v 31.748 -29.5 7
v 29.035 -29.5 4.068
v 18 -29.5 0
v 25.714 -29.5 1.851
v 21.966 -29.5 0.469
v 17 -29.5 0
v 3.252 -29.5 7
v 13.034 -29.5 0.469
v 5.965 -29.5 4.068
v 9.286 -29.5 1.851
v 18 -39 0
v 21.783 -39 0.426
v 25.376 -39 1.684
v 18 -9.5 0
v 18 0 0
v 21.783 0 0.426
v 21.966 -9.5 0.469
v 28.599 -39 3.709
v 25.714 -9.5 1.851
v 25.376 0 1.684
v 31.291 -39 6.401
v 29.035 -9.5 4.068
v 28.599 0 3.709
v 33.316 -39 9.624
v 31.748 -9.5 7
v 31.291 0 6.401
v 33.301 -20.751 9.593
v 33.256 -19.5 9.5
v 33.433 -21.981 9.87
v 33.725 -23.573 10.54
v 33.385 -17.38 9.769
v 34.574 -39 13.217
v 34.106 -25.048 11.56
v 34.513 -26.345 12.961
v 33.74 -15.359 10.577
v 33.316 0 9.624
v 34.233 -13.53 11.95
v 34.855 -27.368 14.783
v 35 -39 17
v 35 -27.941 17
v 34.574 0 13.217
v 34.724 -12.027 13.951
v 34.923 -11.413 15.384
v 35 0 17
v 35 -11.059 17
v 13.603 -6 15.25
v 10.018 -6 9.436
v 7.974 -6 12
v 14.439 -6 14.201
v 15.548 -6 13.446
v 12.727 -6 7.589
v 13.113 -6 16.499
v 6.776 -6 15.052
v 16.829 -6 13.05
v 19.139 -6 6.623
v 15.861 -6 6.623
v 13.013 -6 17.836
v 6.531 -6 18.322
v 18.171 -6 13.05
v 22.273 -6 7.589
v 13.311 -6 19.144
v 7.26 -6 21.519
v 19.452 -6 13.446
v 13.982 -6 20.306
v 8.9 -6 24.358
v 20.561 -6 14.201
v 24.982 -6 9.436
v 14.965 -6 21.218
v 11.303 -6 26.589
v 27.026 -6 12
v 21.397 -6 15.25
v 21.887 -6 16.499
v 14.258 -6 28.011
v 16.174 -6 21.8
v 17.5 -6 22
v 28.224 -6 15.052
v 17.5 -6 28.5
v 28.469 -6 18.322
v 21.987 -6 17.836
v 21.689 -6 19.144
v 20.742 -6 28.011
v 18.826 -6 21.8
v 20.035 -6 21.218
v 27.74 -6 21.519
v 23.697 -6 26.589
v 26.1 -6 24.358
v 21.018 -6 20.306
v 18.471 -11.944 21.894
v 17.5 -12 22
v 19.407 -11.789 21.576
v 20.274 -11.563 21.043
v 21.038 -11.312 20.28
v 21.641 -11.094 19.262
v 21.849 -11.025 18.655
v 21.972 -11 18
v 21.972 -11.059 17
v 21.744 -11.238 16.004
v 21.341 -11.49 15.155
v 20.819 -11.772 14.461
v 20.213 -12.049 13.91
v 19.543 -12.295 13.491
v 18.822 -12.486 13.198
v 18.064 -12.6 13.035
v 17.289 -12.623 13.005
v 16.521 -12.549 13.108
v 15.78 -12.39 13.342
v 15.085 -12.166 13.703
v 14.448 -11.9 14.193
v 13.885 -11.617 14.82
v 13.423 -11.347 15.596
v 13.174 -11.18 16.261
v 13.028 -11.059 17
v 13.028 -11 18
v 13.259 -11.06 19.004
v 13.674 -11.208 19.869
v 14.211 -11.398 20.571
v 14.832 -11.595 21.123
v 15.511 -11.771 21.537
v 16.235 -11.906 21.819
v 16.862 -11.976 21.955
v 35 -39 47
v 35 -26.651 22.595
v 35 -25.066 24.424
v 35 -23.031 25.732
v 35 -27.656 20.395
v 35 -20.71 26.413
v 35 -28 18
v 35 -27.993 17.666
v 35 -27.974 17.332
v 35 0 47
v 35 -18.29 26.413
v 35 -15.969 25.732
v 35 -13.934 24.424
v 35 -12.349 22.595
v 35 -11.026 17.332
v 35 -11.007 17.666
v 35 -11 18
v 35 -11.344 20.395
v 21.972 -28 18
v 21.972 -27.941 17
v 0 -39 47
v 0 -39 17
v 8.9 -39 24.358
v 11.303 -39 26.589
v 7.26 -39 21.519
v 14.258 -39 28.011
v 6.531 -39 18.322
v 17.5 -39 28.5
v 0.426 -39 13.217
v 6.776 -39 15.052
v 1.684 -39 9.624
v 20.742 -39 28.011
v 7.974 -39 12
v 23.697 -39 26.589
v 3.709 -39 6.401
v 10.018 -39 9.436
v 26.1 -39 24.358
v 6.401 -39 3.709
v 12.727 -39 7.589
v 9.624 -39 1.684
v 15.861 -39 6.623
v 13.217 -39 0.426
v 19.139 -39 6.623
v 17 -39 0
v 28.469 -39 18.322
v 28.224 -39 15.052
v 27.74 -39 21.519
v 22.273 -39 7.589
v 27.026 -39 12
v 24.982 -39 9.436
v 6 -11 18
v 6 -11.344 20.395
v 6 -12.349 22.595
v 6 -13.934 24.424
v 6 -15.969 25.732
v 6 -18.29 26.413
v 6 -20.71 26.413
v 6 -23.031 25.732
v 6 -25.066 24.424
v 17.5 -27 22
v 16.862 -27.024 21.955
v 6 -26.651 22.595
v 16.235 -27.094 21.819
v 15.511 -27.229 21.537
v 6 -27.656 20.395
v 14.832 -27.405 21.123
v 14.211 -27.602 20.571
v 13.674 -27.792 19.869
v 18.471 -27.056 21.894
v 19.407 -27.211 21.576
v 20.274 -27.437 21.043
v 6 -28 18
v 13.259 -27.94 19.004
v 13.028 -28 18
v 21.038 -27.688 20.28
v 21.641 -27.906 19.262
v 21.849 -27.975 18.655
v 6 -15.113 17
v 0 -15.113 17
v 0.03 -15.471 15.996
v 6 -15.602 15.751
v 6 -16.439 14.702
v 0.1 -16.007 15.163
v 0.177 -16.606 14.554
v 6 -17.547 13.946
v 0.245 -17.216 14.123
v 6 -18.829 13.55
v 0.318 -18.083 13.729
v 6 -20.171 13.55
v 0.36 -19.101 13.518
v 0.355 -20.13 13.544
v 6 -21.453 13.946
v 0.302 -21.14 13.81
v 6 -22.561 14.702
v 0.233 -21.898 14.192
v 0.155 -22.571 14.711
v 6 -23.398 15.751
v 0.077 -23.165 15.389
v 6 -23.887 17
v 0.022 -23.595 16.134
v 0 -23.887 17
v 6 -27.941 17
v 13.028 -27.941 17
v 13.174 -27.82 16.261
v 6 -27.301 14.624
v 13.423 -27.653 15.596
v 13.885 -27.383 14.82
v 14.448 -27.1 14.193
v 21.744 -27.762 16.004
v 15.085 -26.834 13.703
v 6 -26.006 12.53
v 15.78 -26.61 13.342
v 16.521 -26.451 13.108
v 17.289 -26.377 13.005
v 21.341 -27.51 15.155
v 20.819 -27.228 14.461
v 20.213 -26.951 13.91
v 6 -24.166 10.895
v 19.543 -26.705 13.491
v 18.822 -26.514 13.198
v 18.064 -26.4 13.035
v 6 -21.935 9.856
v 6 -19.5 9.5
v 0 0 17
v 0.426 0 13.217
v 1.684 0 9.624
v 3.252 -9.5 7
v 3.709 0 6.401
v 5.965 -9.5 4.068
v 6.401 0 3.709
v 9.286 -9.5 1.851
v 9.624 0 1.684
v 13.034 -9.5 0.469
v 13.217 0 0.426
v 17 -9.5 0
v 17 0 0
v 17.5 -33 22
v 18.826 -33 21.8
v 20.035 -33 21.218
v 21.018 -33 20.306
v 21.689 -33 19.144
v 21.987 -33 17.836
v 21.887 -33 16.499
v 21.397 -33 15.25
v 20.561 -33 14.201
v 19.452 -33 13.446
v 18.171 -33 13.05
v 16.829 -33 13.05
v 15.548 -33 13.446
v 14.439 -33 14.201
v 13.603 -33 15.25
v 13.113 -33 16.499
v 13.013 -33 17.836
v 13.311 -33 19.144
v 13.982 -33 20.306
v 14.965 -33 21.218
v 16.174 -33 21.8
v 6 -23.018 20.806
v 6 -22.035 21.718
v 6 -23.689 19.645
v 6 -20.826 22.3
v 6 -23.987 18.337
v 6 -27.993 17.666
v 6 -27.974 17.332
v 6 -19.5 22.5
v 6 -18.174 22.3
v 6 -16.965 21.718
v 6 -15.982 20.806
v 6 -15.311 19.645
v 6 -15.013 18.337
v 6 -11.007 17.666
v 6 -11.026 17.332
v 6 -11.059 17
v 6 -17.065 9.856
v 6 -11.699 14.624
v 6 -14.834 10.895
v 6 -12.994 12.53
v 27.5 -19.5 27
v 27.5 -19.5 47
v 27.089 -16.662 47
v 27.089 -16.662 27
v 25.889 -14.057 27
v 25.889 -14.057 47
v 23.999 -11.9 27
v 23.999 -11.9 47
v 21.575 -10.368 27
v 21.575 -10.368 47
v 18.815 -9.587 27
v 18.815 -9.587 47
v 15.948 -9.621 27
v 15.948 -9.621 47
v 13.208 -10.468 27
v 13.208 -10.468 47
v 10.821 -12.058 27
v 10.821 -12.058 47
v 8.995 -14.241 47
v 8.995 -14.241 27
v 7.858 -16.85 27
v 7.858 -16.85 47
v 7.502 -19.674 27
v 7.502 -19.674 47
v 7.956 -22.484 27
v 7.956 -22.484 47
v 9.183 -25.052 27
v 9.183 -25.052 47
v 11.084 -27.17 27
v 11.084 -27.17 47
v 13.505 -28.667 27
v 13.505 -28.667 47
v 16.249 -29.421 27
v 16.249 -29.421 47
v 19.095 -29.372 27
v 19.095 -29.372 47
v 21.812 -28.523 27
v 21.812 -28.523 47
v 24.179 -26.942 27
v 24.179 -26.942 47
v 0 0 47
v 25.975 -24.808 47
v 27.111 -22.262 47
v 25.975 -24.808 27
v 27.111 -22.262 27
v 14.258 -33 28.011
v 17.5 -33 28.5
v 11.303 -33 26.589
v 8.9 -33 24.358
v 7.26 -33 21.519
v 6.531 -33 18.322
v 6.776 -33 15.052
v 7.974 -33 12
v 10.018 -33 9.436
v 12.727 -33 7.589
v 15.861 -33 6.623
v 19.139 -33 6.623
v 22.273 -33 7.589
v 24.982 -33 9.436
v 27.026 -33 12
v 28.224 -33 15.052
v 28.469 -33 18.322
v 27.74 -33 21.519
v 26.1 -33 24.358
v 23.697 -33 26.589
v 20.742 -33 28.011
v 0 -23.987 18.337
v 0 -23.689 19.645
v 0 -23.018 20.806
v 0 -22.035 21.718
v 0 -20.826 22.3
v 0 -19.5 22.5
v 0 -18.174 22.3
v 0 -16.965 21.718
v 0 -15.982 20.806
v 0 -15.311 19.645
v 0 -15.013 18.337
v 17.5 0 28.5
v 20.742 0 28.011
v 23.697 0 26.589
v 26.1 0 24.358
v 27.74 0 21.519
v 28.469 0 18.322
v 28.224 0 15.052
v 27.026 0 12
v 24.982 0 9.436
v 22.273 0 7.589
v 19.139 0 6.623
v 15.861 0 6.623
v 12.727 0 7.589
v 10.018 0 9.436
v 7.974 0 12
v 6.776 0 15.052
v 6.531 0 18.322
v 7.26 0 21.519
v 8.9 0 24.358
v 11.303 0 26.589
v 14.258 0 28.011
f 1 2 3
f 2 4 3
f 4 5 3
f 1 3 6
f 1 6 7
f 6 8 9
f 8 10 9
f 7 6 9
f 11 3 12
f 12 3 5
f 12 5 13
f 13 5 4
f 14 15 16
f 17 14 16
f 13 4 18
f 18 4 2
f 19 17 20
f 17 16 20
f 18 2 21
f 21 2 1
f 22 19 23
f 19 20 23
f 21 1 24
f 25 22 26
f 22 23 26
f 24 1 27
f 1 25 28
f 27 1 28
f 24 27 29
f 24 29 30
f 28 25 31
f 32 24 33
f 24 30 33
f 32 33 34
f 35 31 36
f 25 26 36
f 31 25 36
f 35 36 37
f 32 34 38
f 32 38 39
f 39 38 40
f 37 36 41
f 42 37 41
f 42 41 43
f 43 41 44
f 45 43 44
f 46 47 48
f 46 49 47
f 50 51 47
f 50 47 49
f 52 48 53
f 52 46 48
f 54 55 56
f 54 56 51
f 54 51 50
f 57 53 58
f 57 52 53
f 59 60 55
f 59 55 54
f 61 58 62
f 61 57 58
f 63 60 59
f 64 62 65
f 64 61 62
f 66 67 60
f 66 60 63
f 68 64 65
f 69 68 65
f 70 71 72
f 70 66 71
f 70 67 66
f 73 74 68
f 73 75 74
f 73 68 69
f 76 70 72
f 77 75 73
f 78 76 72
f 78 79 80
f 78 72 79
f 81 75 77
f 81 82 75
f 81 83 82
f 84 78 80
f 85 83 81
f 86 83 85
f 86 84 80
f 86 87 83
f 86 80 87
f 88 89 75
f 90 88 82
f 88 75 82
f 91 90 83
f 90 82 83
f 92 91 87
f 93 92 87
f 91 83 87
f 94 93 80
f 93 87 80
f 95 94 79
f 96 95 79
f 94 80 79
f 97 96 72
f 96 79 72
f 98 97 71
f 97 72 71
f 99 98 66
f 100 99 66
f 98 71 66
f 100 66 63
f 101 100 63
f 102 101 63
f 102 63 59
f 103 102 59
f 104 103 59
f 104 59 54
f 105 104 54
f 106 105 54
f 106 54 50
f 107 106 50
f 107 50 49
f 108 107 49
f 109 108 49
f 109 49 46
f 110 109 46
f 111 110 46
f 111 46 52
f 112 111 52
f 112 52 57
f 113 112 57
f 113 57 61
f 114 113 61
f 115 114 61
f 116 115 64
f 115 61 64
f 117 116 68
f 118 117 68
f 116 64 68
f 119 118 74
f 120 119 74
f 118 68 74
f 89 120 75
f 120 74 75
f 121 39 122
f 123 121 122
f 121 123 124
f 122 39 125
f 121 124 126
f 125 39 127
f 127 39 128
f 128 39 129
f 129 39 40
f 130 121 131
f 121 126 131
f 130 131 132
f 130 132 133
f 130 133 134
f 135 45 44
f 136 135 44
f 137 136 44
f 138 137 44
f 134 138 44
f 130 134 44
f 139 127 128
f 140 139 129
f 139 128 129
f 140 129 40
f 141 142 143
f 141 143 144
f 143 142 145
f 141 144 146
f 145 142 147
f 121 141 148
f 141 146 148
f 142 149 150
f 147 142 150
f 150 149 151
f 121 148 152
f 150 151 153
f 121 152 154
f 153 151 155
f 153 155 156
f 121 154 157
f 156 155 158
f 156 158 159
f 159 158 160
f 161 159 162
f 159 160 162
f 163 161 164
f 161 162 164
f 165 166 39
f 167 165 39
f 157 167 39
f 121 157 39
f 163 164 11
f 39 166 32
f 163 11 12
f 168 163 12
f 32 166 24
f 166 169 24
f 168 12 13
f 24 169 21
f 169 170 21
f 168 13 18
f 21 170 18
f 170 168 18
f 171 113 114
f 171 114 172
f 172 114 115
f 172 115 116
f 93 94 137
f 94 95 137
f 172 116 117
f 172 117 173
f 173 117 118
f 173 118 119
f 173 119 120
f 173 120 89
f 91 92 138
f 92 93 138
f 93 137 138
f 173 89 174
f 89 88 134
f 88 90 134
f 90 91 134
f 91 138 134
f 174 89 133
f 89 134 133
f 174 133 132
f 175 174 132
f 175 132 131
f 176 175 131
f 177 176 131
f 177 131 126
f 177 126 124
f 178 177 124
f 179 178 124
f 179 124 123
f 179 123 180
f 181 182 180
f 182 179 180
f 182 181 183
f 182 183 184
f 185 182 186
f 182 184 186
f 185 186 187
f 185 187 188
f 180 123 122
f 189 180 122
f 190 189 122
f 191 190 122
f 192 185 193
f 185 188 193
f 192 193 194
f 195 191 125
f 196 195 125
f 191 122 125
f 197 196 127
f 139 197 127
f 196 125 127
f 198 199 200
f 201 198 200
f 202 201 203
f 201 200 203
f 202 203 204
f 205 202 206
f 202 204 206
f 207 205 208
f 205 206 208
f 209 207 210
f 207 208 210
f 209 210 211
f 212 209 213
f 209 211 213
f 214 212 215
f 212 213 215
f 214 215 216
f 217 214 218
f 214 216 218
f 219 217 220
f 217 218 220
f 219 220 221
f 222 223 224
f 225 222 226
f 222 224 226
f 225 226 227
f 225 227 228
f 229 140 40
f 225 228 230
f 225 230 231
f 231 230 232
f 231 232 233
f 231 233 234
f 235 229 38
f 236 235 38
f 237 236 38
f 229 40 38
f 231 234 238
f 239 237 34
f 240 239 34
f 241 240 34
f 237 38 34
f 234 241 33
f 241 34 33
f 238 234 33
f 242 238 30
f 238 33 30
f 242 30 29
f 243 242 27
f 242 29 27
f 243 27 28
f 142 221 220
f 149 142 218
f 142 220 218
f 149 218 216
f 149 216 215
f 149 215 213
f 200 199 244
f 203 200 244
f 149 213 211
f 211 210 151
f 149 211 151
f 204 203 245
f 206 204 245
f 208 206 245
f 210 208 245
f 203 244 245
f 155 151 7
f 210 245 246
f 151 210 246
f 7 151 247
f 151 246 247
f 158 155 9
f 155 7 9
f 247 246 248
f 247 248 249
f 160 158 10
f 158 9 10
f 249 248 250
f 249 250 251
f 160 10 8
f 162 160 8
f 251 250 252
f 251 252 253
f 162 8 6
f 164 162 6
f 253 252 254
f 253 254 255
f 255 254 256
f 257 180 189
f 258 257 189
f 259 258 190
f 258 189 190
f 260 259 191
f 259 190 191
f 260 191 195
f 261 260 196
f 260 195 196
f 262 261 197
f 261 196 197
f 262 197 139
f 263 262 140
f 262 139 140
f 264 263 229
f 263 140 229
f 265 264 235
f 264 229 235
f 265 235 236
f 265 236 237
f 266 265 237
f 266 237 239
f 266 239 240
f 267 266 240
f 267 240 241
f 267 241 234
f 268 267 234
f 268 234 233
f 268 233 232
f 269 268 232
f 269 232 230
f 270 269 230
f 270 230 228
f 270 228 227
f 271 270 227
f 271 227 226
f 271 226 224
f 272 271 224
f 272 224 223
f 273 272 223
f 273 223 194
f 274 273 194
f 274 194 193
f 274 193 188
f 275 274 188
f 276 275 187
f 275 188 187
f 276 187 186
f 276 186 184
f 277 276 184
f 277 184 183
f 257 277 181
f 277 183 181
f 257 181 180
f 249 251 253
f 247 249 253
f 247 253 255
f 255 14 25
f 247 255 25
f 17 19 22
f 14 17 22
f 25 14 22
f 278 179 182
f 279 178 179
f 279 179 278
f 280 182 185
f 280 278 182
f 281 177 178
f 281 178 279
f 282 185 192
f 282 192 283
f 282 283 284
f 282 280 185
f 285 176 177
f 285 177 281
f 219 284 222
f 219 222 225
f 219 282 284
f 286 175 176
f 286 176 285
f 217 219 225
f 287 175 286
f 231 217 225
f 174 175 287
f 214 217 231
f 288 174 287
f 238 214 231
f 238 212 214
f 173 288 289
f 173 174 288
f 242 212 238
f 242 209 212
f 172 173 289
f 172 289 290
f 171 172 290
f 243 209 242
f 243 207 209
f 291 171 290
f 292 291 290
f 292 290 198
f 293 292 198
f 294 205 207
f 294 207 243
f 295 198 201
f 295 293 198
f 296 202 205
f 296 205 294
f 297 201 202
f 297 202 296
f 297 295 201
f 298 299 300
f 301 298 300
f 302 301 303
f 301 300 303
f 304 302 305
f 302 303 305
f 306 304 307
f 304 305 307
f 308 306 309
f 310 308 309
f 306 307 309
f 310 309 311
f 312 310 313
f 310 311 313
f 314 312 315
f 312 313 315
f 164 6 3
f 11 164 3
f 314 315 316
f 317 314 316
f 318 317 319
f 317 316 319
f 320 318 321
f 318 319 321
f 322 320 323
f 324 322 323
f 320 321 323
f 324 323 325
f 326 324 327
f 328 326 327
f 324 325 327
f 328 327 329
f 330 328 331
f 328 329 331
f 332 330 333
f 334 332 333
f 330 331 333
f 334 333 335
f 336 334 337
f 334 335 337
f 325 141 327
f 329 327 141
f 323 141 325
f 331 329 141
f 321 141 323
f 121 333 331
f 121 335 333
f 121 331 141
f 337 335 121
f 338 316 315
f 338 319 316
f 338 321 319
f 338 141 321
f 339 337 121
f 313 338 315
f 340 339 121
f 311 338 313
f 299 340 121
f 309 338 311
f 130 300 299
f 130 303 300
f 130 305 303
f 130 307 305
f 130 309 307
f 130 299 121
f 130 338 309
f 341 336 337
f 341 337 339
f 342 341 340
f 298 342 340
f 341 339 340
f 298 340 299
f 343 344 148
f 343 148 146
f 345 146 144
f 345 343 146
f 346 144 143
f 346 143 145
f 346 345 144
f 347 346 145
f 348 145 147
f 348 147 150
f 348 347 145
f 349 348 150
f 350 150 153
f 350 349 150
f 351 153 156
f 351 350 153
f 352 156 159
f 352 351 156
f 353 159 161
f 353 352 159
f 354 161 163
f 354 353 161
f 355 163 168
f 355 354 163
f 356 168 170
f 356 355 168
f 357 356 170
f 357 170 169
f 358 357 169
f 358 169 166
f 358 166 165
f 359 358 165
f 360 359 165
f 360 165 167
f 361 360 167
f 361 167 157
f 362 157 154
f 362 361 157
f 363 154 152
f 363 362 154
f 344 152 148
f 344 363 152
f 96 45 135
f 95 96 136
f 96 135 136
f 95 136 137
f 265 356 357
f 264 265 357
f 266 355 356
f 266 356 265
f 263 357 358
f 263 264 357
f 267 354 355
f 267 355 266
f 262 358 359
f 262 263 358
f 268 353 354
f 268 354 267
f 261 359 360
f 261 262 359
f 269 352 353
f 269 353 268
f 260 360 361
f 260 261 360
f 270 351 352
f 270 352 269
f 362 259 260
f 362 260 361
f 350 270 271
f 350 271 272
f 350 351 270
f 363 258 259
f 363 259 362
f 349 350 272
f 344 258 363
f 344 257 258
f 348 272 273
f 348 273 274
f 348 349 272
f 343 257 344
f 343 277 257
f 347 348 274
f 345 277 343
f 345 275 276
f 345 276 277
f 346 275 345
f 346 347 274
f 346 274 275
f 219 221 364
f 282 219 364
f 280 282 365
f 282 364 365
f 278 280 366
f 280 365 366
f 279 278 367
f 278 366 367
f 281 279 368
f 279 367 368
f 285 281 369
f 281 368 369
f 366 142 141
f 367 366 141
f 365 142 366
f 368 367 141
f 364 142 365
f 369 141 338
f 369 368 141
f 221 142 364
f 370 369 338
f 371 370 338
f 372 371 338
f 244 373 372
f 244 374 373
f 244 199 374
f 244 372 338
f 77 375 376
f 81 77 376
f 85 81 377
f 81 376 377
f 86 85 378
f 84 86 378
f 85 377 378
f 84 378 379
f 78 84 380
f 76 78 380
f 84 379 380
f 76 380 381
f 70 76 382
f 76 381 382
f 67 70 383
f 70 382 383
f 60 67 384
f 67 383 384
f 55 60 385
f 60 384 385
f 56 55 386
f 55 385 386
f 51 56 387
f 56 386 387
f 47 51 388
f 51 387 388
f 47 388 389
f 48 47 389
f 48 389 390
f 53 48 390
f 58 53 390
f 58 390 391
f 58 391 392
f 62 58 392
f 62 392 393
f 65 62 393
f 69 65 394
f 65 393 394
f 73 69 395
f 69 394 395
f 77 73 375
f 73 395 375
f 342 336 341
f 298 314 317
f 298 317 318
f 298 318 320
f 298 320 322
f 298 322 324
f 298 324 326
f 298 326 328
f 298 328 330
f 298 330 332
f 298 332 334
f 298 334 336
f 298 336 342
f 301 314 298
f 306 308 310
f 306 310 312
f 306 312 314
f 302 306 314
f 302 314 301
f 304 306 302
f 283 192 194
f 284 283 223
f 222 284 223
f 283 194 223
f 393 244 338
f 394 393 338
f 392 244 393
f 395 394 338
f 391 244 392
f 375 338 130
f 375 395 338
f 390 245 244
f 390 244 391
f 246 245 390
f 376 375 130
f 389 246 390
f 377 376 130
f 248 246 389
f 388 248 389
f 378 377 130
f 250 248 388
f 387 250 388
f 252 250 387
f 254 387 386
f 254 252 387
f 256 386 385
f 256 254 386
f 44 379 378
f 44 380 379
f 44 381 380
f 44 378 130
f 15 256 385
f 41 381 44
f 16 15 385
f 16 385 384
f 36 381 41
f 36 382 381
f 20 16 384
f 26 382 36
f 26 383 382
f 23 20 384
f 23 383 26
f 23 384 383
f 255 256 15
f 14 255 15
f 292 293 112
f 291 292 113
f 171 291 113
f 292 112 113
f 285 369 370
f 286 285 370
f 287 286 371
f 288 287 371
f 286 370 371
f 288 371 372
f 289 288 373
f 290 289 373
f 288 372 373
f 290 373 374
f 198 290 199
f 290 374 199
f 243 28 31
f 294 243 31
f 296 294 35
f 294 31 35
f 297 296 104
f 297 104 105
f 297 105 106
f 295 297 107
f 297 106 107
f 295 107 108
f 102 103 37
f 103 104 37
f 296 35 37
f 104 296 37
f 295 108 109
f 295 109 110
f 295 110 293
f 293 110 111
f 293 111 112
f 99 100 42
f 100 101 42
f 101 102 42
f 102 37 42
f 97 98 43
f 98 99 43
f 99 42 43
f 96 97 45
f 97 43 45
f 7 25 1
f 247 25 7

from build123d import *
from build123d.topology import SkipClean

# Parameters (mm, degrees)
ESQUISSE1_W             = 35
ESQUISSE1_H             = 39
BOSS_EXTRU_1_DEPTH      = 47
ENL_V_MAT_EXTRU_1_DEPTH = 20
CONG_1_R                = 17
ESQUISSE3_W             = 1
ESQUISSE3_H             = 20
ESQUISSE3_W_2           = 17
ENL_V_MAT_EXTRU_2_DEPTH = 7
ENL_V_MAT_EXTRU_3_DEPTH = 29
ESQUISSE5_R             = 4.5
ENL_V_MAT_EXTRU_4_DEPTH = 71.391760987
ESQUISSE7_R             = 11
ENL_V_MAT_EXTRU_5_DEPTH = 6
ENL_V_START             = -6
ESQUISSE8_R             = 11
ENL_V_MAT_EXTRU_6_DEPTH = 6
ENL_V_MAT_EXTRU_7_DEPTH = 6


with BuildPart() as part:
    # Esquisse1 → Boss.-Extru.1 (new body)
    with BuildSketch(Plane.XY):
        with Locations((17.5, -19.5)):
            Rectangle(ESQUISSE1_W, ESQUISSE1_H)
    extrude(amount=BOSS_EXTRU_1_DEPTH)

    # Esquisse2 → Enlèv. mat.-Extru.1 (cut)
    with BuildSketch(Plane.XY.offset(47)):
        with BuildLine():
            ThreePointArc((27.5, -19.5), (21.574863545, -10.367887041), (10.820902582, -12.057577163))
            Line((10.820902582, -12.057577163), (24.179097418, -26.942422837))
            ThreePointArc((24.179097418, -26.942422837), (26.632112959, -23.574863545), (27.5, -19.5))
        make_face()
        with BuildLine():
            Line((24.179097418, -26.942422837), (10.820902582, -12.057577163))
            ThreePointArc((10.820902582, -12.057577163), (10.057577163, -26.179097418), (24.179097418, -26.942422837))
        make_face()
    extrude(amount=-ENL_V_MAT_EXTRU_1_DEPTH, mode=Mode.SUBTRACT)

    # Congé1
    cong_1_edges = [part.edges().sort_by_distance(p)[0] for p in [
        (35, -19.5, 0),
        (0, -19.5, 0),
    ]]
    fillet(cong_1_edges, radius=CONG_1_R)

    # Esquisse3 → Enlèv. mat.-Extru.2 (cut)
    with BuildSketch(Plane(origin=(0, 0, 0), x_dir=(-1, 0, 0), z_dir=(0, 0, -1))):
        with Locations((-17.5, -19.5)):
            Rectangle(ESQUISSE3_W, ESQUISSE3_H)
        with Locations((-26.5, -19.5)):
            Rectangle(ESQUISSE3_W_2, ESQUISSE3_H)
        with Locations((-8.5, -19.5)):
            Rectangle(ESQUISSE3_W_2, ESQUISSE3_H)
    extrude(amount=-ENL_V_MAT_EXTRU_2_DEPTH, mode=Mode.SUBTRACT)

    # Esquisse4 → Enlèv. mat.-Extru.3 (cut)
    with BuildSketch(Plane(origin=(35, 0, 0), x_dir=(0, 0, -1), z_dir=(1, 0, 0))):
        with BuildLine():
            ThreePointArc((-18, -11), (-26.5, -19.5), (-18, -28))
            Line((-18, -28), (-18, -11))
        make_face()
        with BuildLine():
            Line((-17, -11.059028492), (-17, -27.940971508))
            ThreePointArc((-17, -27.940971508), (-11.645867486, -25.145794895), (-9.5, -19.5))
            ThreePointArc((-9.5, -19.5), (-11.645867486, -13.854205105), (-17, -11.059028492))
        make_face()
        with BuildLine():
            Line((-18, -11), (-18, -28))
            ThreePointArc((-18, -28), (-17.499129667, -27.985230045), (-17, -27.940971508))
            Line((-17, -27.940971508), (-17, -11.059028492))
            ThreePointArc((-17, -11.059028492), (-17.499129667, -11.014769955), (-18, -11))
        make_face()
    extrude(amount=-ENL_V_MAT_EXTRU_3_DEPTH, mode=Mode.SUBTRACT)

    # Esquisse5 → Enlèv. mat.-Extru.4 (cut, through all)
    with SkipClean():  # the faces are left unmerged after this step: merging them gives an invalid solid
        with BuildSketch(Plane(origin=(0, 0, 0), x_dir=(1, 0, 0), z_dir=(0, 1, 0))):
            with Locations(Location((17.5, -17.5, 0), (0, 0, 270))):
                Circle(ESQUISSE5_R)
        extrude(amount=-ENL_V_MAT_EXTRU_4_DEPTH, mode=Mode.SUBTRACT)

    # Esquisse7 → Enlèv. mat.-Extru.5 (cut)
    with SkipClean():  # the faces are left unmerged after this step: merging them gives an invalid solid
        with BuildSketch(Plane(origin=(0, 0, 0), x_dir=(1, 0, 0), z_dir=(0, 1, 0))):
            with Locations(Location((17.5, -17.5, 0), (0, 0, 270))):
                Circle(ESQUISSE7_R)
        extrude(amount=-ENL_V_MAT_EXTRU_5_DEPTH, mode=Mode.SUBTRACT)

    # Esquisse8 → Enlèv. mat.-Extru.6 (cut)
    with SkipClean():  # the faces are left unmerged after this step: merging them gives an invalid solid
        with BuildSketch(Plane.XZ.offset(39).offset(ENL_V_START)):
            with Locations(Location((17.5, 17.5, 0), (0, 0, 90))):
                Circle(ESQUISSE8_R)
        extrude(amount=ENL_V_MAT_EXTRU_6_DEPTH, mode=Mode.SUBTRACT)

    # Esquisse10 → Enlèv. mat.-Extru.7 (cut)
    with SkipClean():  # the faces are left unmerged after this step: merging them gives an invalid solid
        with BuildSketch(Plane.ZY):
            with BuildLine():
                ThreePointArc((17, -23.887482194), (20.80624304, -23.01781182), (22.5, -19.5))
                ThreePointArc((22.5, -19.5), (20.80624304, -15.98218818), (17, -15.112517806))
                Line((17, -15.112517806), (17, -23.887482194))
            make_face()
            with BuildLine():
                Line((17, -23.887482194), (17, -15.112517806))
                ThreePointArc((17, -15.112517806), (13.5, -19.5), (17, -23.887482194))
            make_face()
        extrude(amount=-ENL_V_MAT_EXTRU_7_DEPTH, mode=Mode.SUBTRACT)


solid = part.part
